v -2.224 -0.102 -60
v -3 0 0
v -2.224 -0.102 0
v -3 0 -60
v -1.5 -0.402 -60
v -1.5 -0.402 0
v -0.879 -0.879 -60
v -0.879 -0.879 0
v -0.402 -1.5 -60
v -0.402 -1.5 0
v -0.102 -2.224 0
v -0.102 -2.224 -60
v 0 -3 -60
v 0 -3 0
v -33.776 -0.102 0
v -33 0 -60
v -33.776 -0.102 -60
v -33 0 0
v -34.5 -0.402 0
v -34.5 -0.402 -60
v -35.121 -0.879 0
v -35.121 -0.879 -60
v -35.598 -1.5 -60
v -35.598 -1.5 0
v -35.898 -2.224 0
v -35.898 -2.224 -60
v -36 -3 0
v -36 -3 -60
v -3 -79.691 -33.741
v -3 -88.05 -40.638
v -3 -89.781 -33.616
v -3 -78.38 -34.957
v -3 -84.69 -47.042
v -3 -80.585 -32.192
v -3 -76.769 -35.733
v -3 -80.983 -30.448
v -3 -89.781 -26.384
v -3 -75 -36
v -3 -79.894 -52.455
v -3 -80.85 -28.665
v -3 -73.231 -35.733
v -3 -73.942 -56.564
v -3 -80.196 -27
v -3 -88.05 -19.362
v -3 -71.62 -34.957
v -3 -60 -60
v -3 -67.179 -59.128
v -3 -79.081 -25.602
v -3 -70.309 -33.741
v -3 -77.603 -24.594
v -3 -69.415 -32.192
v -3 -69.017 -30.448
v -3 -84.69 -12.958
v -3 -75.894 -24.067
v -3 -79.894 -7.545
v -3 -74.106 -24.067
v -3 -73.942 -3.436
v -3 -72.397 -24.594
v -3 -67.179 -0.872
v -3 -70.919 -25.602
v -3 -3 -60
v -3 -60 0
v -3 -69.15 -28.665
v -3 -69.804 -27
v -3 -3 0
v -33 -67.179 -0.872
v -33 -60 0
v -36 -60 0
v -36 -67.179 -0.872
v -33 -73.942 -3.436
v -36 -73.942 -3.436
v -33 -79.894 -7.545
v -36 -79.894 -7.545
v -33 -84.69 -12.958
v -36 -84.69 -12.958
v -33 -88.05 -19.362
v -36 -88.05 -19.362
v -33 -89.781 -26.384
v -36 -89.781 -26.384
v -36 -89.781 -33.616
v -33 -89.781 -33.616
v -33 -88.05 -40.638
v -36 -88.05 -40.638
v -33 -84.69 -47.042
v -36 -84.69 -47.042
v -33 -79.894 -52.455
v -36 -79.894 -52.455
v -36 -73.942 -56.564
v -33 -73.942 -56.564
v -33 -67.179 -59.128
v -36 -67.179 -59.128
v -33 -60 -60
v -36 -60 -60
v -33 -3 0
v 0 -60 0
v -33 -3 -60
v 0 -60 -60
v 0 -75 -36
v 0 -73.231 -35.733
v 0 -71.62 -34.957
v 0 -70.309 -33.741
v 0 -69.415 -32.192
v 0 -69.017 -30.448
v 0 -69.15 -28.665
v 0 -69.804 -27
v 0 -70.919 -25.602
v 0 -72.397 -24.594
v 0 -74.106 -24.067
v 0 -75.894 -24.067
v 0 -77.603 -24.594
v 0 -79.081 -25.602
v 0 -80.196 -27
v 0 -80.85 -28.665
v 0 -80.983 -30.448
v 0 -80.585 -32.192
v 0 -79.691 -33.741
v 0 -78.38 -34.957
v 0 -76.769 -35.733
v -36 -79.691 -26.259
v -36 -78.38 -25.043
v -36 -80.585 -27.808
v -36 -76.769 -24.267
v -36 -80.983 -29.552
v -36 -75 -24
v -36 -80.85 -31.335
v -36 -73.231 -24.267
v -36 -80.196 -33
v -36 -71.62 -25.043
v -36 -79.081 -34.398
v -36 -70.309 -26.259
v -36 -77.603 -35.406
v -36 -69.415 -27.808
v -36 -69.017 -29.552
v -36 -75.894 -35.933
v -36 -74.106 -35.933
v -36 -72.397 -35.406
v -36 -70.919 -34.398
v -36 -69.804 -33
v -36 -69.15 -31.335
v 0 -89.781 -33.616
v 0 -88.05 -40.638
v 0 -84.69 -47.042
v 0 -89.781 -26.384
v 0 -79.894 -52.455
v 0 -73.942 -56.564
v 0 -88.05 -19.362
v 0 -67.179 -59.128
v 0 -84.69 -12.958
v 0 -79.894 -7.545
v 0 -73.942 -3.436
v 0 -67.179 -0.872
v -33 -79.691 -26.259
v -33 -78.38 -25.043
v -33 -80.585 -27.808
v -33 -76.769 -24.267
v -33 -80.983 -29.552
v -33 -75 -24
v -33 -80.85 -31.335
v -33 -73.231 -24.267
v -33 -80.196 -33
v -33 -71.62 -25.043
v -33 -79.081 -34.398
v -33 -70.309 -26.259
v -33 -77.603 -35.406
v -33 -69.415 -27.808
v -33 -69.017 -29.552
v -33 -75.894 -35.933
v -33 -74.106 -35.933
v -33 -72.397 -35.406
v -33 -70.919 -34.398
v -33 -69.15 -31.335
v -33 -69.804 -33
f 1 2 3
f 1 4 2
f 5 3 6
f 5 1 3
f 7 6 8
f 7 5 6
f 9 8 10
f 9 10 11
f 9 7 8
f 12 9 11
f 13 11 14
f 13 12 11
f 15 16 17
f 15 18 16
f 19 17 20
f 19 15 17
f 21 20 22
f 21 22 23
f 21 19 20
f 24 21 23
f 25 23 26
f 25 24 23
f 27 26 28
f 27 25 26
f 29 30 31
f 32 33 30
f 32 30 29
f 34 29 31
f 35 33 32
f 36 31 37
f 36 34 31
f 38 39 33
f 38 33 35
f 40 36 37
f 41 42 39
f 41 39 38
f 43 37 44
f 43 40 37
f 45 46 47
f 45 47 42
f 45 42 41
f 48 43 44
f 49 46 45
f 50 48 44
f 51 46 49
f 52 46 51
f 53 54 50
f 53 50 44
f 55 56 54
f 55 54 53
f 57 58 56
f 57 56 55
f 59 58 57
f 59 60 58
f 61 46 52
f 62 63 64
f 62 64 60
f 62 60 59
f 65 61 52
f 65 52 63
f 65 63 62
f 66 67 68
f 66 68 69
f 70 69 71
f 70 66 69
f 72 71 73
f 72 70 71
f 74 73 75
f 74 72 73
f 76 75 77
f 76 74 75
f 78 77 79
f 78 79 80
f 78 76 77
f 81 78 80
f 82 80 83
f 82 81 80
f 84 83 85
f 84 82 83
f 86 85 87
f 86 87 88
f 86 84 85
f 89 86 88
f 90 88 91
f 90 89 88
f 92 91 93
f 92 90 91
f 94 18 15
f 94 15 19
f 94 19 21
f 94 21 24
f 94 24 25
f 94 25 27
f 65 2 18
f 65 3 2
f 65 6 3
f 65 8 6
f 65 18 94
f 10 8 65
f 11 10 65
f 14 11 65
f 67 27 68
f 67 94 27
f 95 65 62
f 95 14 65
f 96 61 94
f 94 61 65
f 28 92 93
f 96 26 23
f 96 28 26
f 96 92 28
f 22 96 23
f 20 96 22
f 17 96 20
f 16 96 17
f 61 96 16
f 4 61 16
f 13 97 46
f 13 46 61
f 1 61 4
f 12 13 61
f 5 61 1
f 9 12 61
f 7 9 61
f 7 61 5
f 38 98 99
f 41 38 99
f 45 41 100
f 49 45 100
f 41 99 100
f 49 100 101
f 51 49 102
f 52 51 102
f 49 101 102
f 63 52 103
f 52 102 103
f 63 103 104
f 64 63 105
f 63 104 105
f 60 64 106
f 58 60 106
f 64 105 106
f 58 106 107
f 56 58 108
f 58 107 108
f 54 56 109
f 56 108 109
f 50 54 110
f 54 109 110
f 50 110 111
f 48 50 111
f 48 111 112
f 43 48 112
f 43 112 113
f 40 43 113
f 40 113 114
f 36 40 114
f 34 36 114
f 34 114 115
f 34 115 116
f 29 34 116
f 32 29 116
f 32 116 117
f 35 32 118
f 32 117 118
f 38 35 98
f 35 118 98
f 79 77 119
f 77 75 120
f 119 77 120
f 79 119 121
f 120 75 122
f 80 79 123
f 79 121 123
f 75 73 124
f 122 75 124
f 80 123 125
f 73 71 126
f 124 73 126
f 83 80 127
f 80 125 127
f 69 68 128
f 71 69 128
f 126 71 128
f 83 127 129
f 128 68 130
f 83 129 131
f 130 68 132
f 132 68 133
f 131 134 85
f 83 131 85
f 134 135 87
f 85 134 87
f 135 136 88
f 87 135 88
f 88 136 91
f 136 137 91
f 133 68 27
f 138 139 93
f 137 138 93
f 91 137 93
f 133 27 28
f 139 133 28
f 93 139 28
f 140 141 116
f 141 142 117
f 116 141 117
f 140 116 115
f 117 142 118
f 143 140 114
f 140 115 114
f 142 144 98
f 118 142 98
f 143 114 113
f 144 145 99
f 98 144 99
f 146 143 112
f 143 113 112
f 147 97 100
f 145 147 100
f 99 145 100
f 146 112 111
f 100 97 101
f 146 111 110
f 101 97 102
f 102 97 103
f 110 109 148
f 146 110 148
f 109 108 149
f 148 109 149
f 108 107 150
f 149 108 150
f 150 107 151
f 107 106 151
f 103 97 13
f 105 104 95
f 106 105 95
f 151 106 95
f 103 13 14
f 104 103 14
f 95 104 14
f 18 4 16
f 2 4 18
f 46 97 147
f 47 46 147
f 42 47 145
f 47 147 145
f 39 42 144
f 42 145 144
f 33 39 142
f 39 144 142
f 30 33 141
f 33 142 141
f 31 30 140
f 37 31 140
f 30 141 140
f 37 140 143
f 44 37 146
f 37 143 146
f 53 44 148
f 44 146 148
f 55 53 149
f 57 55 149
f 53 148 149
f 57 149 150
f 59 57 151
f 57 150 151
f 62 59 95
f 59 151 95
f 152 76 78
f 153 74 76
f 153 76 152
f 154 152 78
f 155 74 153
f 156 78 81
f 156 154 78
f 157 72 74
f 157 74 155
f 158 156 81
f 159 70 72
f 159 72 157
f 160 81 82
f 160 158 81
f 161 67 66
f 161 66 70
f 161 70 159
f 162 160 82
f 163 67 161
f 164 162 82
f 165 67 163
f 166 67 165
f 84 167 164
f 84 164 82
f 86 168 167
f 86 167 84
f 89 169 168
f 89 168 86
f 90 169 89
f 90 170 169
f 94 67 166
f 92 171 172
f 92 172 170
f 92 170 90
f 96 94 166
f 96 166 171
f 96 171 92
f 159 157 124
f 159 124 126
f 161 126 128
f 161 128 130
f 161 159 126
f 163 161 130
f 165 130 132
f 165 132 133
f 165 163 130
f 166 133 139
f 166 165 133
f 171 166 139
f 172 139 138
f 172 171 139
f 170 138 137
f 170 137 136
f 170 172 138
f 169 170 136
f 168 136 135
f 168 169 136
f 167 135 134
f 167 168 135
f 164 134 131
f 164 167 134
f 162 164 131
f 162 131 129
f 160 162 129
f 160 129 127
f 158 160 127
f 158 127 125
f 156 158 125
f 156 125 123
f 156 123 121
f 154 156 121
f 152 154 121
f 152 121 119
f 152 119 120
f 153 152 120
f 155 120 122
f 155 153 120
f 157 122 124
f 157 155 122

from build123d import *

# Parameters (mm, degrees)
SKETCH1_R           = 6
BOSS_EXTRUDE1_DEPTH = 3
SKETCH2_W           = 60
SKETCH2_H           = 3
BOSS_EXTRUDE2_DEPTH = 30
SKETCH3_R           = 6
BOSS_EXTRUDE4_DEPTH = 3
FILLET1_R           = 3


with BuildPart() as part:
    # Sketch1 → Boss-Extrude1 (new body)
    with BuildSketch(Plane(origin=(0, 0, 0), x_dir=(0, 0, -1), z_dir=(1, 0, 0))):
        with BuildLine():
            Line((0, 0), (60, 0))
            Line((60, 0), (60, -60))
            ThreePointArc((60, -60), (30, -90), (0, -60))
            Line((0, -60), (0, 0))
        make_face()
        with Locations((30, -75)):
            Circle(SKETCH1_R, mode=Mode.SUBTRACT)
    extrude(amount=-BOSS_EXTRUDE1_DEPTH)

    # Sketch2 → Boss-Extrude2 (add)
    with BuildSketch(Plane.ZY.offset(3)):
        with Locations((-30, -1.5)):
            Rectangle(SKETCH2_W, SKETCH2_H)
    extrude(amount=BOSS_EXTRUDE2_DEPTH)

    # Sketch3 → Boss-Extrude4 (add)
    with BuildSketch(Plane.ZY.offset(33)):
        with BuildLine():
            Line((-60, 0), (0, 0))
            Line((0, 0), (0, -60))
            ThreePointArc((0, -60), (-30, -90), (-60, -60))
            Line((-60, -60), (-60, 0))
        make_face()
        with Locations((-30, -75)):
            Circle(SKETCH3_R, mode=Mode.SUBTRACT)
    extrude(amount=BOSS_EXTRUDE4_DEPTH)

    # Fillet1
    fillet1_edges = [part.edges().sort_by_distance(p)[0] for p in [
        (-36, 0, -30),
        (0, 0, -30),
    ]]
    fillet(fillet1_edges, radius=FILLET1_R)


solid = part.part
